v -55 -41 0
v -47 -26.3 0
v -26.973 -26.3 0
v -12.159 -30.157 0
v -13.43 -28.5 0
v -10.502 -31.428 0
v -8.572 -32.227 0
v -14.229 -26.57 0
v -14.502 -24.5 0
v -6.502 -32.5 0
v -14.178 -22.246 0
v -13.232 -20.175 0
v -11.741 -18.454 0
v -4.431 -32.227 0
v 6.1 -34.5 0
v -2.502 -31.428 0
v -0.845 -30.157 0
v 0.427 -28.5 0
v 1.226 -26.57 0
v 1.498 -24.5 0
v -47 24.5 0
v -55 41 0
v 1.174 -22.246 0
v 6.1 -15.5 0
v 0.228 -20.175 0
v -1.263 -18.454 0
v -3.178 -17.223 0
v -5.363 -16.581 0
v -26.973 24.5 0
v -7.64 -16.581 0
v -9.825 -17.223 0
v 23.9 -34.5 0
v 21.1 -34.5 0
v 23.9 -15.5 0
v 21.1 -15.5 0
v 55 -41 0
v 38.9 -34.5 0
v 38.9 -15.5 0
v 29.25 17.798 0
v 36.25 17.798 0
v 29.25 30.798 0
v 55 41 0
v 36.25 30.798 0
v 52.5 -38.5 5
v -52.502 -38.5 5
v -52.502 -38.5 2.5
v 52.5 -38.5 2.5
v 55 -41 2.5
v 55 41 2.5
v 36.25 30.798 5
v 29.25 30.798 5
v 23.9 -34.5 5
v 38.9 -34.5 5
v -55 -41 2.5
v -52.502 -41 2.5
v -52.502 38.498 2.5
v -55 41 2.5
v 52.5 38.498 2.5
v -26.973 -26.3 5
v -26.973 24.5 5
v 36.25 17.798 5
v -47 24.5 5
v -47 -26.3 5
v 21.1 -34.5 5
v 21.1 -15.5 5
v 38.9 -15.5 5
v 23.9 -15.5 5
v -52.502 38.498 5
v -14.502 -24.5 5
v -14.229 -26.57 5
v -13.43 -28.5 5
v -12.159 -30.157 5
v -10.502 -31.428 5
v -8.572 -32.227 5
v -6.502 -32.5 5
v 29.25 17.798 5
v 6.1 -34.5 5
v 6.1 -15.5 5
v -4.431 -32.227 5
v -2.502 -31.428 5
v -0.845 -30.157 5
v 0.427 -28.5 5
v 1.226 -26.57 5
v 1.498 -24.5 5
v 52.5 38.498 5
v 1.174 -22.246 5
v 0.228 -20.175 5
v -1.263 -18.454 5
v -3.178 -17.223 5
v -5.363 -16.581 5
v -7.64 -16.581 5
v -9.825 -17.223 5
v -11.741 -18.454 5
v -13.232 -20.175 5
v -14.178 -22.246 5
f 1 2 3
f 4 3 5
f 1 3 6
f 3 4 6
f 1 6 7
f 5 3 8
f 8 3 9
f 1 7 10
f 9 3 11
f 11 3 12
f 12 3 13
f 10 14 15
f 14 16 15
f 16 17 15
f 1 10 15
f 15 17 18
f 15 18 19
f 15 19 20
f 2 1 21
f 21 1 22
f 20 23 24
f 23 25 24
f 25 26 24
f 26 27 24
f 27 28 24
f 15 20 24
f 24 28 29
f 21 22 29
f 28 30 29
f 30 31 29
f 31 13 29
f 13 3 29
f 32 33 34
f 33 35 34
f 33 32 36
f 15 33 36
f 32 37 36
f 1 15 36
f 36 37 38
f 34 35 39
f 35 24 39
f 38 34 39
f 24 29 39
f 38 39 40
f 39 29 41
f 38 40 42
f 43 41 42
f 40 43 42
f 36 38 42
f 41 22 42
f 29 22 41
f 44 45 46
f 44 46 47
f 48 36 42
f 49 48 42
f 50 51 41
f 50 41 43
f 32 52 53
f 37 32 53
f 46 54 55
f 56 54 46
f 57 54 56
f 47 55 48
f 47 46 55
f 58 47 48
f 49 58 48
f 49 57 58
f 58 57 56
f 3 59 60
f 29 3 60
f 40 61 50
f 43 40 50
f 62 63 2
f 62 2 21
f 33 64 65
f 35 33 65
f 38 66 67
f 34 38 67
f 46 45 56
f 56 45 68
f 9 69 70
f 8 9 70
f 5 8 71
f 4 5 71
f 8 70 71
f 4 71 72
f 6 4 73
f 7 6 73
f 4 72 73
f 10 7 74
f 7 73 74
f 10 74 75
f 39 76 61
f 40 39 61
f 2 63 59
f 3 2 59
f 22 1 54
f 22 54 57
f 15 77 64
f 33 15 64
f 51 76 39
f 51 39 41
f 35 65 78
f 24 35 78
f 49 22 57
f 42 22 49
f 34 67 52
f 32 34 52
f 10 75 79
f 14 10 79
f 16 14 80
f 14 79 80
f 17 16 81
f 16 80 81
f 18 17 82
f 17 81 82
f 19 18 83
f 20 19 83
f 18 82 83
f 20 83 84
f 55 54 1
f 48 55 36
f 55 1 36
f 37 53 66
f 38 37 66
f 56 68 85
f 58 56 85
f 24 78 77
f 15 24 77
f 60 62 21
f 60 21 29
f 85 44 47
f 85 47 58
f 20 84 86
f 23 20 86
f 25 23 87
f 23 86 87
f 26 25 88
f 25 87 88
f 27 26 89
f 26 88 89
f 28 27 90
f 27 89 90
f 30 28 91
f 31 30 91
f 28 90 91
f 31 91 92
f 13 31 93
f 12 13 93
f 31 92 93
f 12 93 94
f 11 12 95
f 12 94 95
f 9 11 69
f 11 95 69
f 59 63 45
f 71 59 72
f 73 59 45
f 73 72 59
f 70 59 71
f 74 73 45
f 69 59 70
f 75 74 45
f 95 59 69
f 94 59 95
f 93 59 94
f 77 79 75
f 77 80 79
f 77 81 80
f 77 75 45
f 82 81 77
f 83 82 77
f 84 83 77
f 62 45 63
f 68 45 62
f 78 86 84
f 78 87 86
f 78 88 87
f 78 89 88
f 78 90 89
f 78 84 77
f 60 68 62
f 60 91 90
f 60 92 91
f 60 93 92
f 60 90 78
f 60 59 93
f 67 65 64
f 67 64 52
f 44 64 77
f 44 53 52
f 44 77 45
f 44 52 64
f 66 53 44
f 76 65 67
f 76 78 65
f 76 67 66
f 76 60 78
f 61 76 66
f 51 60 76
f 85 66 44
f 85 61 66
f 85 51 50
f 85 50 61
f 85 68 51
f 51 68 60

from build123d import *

# Parameters (mm, degrees)
SKETCH2_W           = 110
SKETCH2_H           = 82
BOSS_EXTRUDE1_DEPTH = 5
SKETCH13_W          = 20.02707563
SKETCH13_H          = 50.8
CUT_EXTRUDE12_DEPTH = 5
SKETCH14_W          = 2.498354032
SKETCH14_H          = 82
CUT_EXTRUDE13_DEPTH = 2.5
SKETCH15_W          = 107.501645968
SKETCH15_H          = 2.500122833
CUT_EXTRUDE14_DEPTH = 2.5
SKETCH16_W          = 107.501645968
SKETCH16_H          = 2.501703456
CUT_EXTRUDE15_DEPTH = 2.5
SKETCH18_W          = 2.5
SKETCH18_H          = 76.998173711
CUT_EXTRUDE18_DEPTH = 2.5
SKETCH19_W          = 7.5
SKETCH19_H          = 9.5
CUT_EXTRUDE19_DEPTH = 10
SKETCH20_W          = 7.5
SKETCH20_H          = 9.5
CUT_EXTRUDE20_DEPTH = 10
CUT_EXTRUDE21_DEPTH = 8
SKETCH22_W          = 7
SKETCH22_H          = 13
CUT_EXTRUDE22_DEPTH = 10


with BuildPart() as part:
    # Sketch2 → Boss-Extrude1 (new body)
    with BuildSketch(Plane.XY):
        Rectangle(SKETCH2_W, SKETCH2_H)
    extrude(amount=BOSS_EXTRUDE1_DEPTH)

    # Sketch13 → Cut-Extrude12 (cut)
    with BuildSketch(Plane.XY.offset(5)):
        with Locations((-36.986462185, -0.9)):
            Rectangle(SKETCH13_W, SKETCH13_H)
    extrude(amount=-CUT_EXTRUDE12_DEPTH, mode=Mode.SUBTRACT)

    # Sketch14 → Cut-Extrude13 (cut)
    with BuildSketch(Plane.XY.offset(5)):
        with Locations((-53.750822984, 0)):
            Rectangle(SKETCH14_W, SKETCH14_H)
    extrude(amount=-CUT_EXTRUDE13_DEPTH, mode=Mode.SUBTRACT)

    # Sketch15 → Cut-Extrude14 (cut)
    with BuildSketch(Plane.XY.offset(5)):
        with Locations((1.249177016, -39.749938583)):
            Rectangle(SKETCH15_W, SKETCH15_H)
    extrude(amount=-CUT_EXTRUDE14_DEPTH, mode=Mode.SUBTRACT)

    # Sketch16 → Cut-Extrude15 (cut)
    with BuildSketch(Plane.XY.offset(5)):
        with Locations((1.249177016, 39.749148272)):
            Rectangle(SKETCH16_W, SKETCH16_H)
    extrude(amount=-CUT_EXTRUDE15_DEPTH, mode=Mode.SUBTRACT)

    # Sketch18 → Cut-Extrude18 (cut)
    with BuildSketch(Plane.XY.offset(5)):
        with Locations((53.75, -0.000790311)):
            Rectangle(SKETCH18_W, SKETCH18_H)
    extrude(amount=-CUT_EXTRUDE18_DEPTH, mode=Mode.SUBTRACT)

    # Sketch19 → Cut-Extrude19 (cut)
    with BuildSketch(Plane.XY.offset(5)):
        Polygon((6.1, -34.499877167), (13.6, -34.499877167), (13.6, -24.999877167), (21.1, -24.999877167), (21.1, -15.499877167), (6.1, -15.499877167), align=None)
        with Locations((17.35, -29.749877167)):
            Rectangle(SKETCH19_W, SKETCH19_H)
    extrude(amount=-CUT_EXTRUDE19_DEPTH, mode=Mode.SUBTRACT)

    # Sketch20 → Cut-Extrude20 (cut)
    with BuildSketch(Plane.XY.offset(5)):
        Polygon((31.4, -24.999877167), (38.9, -24.999877167), (38.9, -15.499877167), (23.9, -15.499877167), (23.9, -34.499877167), (31.4, -34.499877167), align=None)
        with Locations((35.15, -29.749877167)):
            Rectangle(SKETCH20_W, SKETCH20_H)
    extrude(amount=-CUT_EXTRUDE20_DEPTH, mode=Mode.SUBTRACT)

    # Sketch21 → Cut-Extrude21 (cut)
    with BuildSketch(Plane.XY.offset(5)):
        with BuildLine():
            ThreePointArc((1.498354032, -24.499877167), (-6.501645968, -16.499877167), (-14.501645968, -24.499877167))
            Line((-14.501645968, -24.499877167), (-6.501645968, -24.499877167))
            Line((-6.501645968, -24.499877167), (-6.501645968, -32.499877167))
            ThreePointArc((-6.501645968, -32.499877167), (-0.844791718, -30.156731417), (1.498354032, -24.499877167))
        make_face()
        with BuildLine():
            Line((-6.501645968, -24.499877167), (-14.501645968, -24.499877167))
            ThreePointArc((-14.501645968, -24.499877167), (-12.158500217, -30.156731417), (-6.501645968, -32.499877167))
            Line((-6.501645968, -32.499877167), (-6.501645968, -24.499877167))
        make_face()
    extrude(amount=-CUT_EXTRUDE21_DEPTH, mode=Mode.SUBTRACT)

    # Sketch22 → Cut-Extrude22 (cut)
    with BuildSketch(Plane.XY.offset(5)):
        with Locations((32.75, 24.298296544)):
            Rectangle(SKETCH22_W, SKETCH22_H)
    extrude(amount=-CUT_EXTRUDE22_DEPTH, mode=Mode.SUBTRACT)


solid = part.part
